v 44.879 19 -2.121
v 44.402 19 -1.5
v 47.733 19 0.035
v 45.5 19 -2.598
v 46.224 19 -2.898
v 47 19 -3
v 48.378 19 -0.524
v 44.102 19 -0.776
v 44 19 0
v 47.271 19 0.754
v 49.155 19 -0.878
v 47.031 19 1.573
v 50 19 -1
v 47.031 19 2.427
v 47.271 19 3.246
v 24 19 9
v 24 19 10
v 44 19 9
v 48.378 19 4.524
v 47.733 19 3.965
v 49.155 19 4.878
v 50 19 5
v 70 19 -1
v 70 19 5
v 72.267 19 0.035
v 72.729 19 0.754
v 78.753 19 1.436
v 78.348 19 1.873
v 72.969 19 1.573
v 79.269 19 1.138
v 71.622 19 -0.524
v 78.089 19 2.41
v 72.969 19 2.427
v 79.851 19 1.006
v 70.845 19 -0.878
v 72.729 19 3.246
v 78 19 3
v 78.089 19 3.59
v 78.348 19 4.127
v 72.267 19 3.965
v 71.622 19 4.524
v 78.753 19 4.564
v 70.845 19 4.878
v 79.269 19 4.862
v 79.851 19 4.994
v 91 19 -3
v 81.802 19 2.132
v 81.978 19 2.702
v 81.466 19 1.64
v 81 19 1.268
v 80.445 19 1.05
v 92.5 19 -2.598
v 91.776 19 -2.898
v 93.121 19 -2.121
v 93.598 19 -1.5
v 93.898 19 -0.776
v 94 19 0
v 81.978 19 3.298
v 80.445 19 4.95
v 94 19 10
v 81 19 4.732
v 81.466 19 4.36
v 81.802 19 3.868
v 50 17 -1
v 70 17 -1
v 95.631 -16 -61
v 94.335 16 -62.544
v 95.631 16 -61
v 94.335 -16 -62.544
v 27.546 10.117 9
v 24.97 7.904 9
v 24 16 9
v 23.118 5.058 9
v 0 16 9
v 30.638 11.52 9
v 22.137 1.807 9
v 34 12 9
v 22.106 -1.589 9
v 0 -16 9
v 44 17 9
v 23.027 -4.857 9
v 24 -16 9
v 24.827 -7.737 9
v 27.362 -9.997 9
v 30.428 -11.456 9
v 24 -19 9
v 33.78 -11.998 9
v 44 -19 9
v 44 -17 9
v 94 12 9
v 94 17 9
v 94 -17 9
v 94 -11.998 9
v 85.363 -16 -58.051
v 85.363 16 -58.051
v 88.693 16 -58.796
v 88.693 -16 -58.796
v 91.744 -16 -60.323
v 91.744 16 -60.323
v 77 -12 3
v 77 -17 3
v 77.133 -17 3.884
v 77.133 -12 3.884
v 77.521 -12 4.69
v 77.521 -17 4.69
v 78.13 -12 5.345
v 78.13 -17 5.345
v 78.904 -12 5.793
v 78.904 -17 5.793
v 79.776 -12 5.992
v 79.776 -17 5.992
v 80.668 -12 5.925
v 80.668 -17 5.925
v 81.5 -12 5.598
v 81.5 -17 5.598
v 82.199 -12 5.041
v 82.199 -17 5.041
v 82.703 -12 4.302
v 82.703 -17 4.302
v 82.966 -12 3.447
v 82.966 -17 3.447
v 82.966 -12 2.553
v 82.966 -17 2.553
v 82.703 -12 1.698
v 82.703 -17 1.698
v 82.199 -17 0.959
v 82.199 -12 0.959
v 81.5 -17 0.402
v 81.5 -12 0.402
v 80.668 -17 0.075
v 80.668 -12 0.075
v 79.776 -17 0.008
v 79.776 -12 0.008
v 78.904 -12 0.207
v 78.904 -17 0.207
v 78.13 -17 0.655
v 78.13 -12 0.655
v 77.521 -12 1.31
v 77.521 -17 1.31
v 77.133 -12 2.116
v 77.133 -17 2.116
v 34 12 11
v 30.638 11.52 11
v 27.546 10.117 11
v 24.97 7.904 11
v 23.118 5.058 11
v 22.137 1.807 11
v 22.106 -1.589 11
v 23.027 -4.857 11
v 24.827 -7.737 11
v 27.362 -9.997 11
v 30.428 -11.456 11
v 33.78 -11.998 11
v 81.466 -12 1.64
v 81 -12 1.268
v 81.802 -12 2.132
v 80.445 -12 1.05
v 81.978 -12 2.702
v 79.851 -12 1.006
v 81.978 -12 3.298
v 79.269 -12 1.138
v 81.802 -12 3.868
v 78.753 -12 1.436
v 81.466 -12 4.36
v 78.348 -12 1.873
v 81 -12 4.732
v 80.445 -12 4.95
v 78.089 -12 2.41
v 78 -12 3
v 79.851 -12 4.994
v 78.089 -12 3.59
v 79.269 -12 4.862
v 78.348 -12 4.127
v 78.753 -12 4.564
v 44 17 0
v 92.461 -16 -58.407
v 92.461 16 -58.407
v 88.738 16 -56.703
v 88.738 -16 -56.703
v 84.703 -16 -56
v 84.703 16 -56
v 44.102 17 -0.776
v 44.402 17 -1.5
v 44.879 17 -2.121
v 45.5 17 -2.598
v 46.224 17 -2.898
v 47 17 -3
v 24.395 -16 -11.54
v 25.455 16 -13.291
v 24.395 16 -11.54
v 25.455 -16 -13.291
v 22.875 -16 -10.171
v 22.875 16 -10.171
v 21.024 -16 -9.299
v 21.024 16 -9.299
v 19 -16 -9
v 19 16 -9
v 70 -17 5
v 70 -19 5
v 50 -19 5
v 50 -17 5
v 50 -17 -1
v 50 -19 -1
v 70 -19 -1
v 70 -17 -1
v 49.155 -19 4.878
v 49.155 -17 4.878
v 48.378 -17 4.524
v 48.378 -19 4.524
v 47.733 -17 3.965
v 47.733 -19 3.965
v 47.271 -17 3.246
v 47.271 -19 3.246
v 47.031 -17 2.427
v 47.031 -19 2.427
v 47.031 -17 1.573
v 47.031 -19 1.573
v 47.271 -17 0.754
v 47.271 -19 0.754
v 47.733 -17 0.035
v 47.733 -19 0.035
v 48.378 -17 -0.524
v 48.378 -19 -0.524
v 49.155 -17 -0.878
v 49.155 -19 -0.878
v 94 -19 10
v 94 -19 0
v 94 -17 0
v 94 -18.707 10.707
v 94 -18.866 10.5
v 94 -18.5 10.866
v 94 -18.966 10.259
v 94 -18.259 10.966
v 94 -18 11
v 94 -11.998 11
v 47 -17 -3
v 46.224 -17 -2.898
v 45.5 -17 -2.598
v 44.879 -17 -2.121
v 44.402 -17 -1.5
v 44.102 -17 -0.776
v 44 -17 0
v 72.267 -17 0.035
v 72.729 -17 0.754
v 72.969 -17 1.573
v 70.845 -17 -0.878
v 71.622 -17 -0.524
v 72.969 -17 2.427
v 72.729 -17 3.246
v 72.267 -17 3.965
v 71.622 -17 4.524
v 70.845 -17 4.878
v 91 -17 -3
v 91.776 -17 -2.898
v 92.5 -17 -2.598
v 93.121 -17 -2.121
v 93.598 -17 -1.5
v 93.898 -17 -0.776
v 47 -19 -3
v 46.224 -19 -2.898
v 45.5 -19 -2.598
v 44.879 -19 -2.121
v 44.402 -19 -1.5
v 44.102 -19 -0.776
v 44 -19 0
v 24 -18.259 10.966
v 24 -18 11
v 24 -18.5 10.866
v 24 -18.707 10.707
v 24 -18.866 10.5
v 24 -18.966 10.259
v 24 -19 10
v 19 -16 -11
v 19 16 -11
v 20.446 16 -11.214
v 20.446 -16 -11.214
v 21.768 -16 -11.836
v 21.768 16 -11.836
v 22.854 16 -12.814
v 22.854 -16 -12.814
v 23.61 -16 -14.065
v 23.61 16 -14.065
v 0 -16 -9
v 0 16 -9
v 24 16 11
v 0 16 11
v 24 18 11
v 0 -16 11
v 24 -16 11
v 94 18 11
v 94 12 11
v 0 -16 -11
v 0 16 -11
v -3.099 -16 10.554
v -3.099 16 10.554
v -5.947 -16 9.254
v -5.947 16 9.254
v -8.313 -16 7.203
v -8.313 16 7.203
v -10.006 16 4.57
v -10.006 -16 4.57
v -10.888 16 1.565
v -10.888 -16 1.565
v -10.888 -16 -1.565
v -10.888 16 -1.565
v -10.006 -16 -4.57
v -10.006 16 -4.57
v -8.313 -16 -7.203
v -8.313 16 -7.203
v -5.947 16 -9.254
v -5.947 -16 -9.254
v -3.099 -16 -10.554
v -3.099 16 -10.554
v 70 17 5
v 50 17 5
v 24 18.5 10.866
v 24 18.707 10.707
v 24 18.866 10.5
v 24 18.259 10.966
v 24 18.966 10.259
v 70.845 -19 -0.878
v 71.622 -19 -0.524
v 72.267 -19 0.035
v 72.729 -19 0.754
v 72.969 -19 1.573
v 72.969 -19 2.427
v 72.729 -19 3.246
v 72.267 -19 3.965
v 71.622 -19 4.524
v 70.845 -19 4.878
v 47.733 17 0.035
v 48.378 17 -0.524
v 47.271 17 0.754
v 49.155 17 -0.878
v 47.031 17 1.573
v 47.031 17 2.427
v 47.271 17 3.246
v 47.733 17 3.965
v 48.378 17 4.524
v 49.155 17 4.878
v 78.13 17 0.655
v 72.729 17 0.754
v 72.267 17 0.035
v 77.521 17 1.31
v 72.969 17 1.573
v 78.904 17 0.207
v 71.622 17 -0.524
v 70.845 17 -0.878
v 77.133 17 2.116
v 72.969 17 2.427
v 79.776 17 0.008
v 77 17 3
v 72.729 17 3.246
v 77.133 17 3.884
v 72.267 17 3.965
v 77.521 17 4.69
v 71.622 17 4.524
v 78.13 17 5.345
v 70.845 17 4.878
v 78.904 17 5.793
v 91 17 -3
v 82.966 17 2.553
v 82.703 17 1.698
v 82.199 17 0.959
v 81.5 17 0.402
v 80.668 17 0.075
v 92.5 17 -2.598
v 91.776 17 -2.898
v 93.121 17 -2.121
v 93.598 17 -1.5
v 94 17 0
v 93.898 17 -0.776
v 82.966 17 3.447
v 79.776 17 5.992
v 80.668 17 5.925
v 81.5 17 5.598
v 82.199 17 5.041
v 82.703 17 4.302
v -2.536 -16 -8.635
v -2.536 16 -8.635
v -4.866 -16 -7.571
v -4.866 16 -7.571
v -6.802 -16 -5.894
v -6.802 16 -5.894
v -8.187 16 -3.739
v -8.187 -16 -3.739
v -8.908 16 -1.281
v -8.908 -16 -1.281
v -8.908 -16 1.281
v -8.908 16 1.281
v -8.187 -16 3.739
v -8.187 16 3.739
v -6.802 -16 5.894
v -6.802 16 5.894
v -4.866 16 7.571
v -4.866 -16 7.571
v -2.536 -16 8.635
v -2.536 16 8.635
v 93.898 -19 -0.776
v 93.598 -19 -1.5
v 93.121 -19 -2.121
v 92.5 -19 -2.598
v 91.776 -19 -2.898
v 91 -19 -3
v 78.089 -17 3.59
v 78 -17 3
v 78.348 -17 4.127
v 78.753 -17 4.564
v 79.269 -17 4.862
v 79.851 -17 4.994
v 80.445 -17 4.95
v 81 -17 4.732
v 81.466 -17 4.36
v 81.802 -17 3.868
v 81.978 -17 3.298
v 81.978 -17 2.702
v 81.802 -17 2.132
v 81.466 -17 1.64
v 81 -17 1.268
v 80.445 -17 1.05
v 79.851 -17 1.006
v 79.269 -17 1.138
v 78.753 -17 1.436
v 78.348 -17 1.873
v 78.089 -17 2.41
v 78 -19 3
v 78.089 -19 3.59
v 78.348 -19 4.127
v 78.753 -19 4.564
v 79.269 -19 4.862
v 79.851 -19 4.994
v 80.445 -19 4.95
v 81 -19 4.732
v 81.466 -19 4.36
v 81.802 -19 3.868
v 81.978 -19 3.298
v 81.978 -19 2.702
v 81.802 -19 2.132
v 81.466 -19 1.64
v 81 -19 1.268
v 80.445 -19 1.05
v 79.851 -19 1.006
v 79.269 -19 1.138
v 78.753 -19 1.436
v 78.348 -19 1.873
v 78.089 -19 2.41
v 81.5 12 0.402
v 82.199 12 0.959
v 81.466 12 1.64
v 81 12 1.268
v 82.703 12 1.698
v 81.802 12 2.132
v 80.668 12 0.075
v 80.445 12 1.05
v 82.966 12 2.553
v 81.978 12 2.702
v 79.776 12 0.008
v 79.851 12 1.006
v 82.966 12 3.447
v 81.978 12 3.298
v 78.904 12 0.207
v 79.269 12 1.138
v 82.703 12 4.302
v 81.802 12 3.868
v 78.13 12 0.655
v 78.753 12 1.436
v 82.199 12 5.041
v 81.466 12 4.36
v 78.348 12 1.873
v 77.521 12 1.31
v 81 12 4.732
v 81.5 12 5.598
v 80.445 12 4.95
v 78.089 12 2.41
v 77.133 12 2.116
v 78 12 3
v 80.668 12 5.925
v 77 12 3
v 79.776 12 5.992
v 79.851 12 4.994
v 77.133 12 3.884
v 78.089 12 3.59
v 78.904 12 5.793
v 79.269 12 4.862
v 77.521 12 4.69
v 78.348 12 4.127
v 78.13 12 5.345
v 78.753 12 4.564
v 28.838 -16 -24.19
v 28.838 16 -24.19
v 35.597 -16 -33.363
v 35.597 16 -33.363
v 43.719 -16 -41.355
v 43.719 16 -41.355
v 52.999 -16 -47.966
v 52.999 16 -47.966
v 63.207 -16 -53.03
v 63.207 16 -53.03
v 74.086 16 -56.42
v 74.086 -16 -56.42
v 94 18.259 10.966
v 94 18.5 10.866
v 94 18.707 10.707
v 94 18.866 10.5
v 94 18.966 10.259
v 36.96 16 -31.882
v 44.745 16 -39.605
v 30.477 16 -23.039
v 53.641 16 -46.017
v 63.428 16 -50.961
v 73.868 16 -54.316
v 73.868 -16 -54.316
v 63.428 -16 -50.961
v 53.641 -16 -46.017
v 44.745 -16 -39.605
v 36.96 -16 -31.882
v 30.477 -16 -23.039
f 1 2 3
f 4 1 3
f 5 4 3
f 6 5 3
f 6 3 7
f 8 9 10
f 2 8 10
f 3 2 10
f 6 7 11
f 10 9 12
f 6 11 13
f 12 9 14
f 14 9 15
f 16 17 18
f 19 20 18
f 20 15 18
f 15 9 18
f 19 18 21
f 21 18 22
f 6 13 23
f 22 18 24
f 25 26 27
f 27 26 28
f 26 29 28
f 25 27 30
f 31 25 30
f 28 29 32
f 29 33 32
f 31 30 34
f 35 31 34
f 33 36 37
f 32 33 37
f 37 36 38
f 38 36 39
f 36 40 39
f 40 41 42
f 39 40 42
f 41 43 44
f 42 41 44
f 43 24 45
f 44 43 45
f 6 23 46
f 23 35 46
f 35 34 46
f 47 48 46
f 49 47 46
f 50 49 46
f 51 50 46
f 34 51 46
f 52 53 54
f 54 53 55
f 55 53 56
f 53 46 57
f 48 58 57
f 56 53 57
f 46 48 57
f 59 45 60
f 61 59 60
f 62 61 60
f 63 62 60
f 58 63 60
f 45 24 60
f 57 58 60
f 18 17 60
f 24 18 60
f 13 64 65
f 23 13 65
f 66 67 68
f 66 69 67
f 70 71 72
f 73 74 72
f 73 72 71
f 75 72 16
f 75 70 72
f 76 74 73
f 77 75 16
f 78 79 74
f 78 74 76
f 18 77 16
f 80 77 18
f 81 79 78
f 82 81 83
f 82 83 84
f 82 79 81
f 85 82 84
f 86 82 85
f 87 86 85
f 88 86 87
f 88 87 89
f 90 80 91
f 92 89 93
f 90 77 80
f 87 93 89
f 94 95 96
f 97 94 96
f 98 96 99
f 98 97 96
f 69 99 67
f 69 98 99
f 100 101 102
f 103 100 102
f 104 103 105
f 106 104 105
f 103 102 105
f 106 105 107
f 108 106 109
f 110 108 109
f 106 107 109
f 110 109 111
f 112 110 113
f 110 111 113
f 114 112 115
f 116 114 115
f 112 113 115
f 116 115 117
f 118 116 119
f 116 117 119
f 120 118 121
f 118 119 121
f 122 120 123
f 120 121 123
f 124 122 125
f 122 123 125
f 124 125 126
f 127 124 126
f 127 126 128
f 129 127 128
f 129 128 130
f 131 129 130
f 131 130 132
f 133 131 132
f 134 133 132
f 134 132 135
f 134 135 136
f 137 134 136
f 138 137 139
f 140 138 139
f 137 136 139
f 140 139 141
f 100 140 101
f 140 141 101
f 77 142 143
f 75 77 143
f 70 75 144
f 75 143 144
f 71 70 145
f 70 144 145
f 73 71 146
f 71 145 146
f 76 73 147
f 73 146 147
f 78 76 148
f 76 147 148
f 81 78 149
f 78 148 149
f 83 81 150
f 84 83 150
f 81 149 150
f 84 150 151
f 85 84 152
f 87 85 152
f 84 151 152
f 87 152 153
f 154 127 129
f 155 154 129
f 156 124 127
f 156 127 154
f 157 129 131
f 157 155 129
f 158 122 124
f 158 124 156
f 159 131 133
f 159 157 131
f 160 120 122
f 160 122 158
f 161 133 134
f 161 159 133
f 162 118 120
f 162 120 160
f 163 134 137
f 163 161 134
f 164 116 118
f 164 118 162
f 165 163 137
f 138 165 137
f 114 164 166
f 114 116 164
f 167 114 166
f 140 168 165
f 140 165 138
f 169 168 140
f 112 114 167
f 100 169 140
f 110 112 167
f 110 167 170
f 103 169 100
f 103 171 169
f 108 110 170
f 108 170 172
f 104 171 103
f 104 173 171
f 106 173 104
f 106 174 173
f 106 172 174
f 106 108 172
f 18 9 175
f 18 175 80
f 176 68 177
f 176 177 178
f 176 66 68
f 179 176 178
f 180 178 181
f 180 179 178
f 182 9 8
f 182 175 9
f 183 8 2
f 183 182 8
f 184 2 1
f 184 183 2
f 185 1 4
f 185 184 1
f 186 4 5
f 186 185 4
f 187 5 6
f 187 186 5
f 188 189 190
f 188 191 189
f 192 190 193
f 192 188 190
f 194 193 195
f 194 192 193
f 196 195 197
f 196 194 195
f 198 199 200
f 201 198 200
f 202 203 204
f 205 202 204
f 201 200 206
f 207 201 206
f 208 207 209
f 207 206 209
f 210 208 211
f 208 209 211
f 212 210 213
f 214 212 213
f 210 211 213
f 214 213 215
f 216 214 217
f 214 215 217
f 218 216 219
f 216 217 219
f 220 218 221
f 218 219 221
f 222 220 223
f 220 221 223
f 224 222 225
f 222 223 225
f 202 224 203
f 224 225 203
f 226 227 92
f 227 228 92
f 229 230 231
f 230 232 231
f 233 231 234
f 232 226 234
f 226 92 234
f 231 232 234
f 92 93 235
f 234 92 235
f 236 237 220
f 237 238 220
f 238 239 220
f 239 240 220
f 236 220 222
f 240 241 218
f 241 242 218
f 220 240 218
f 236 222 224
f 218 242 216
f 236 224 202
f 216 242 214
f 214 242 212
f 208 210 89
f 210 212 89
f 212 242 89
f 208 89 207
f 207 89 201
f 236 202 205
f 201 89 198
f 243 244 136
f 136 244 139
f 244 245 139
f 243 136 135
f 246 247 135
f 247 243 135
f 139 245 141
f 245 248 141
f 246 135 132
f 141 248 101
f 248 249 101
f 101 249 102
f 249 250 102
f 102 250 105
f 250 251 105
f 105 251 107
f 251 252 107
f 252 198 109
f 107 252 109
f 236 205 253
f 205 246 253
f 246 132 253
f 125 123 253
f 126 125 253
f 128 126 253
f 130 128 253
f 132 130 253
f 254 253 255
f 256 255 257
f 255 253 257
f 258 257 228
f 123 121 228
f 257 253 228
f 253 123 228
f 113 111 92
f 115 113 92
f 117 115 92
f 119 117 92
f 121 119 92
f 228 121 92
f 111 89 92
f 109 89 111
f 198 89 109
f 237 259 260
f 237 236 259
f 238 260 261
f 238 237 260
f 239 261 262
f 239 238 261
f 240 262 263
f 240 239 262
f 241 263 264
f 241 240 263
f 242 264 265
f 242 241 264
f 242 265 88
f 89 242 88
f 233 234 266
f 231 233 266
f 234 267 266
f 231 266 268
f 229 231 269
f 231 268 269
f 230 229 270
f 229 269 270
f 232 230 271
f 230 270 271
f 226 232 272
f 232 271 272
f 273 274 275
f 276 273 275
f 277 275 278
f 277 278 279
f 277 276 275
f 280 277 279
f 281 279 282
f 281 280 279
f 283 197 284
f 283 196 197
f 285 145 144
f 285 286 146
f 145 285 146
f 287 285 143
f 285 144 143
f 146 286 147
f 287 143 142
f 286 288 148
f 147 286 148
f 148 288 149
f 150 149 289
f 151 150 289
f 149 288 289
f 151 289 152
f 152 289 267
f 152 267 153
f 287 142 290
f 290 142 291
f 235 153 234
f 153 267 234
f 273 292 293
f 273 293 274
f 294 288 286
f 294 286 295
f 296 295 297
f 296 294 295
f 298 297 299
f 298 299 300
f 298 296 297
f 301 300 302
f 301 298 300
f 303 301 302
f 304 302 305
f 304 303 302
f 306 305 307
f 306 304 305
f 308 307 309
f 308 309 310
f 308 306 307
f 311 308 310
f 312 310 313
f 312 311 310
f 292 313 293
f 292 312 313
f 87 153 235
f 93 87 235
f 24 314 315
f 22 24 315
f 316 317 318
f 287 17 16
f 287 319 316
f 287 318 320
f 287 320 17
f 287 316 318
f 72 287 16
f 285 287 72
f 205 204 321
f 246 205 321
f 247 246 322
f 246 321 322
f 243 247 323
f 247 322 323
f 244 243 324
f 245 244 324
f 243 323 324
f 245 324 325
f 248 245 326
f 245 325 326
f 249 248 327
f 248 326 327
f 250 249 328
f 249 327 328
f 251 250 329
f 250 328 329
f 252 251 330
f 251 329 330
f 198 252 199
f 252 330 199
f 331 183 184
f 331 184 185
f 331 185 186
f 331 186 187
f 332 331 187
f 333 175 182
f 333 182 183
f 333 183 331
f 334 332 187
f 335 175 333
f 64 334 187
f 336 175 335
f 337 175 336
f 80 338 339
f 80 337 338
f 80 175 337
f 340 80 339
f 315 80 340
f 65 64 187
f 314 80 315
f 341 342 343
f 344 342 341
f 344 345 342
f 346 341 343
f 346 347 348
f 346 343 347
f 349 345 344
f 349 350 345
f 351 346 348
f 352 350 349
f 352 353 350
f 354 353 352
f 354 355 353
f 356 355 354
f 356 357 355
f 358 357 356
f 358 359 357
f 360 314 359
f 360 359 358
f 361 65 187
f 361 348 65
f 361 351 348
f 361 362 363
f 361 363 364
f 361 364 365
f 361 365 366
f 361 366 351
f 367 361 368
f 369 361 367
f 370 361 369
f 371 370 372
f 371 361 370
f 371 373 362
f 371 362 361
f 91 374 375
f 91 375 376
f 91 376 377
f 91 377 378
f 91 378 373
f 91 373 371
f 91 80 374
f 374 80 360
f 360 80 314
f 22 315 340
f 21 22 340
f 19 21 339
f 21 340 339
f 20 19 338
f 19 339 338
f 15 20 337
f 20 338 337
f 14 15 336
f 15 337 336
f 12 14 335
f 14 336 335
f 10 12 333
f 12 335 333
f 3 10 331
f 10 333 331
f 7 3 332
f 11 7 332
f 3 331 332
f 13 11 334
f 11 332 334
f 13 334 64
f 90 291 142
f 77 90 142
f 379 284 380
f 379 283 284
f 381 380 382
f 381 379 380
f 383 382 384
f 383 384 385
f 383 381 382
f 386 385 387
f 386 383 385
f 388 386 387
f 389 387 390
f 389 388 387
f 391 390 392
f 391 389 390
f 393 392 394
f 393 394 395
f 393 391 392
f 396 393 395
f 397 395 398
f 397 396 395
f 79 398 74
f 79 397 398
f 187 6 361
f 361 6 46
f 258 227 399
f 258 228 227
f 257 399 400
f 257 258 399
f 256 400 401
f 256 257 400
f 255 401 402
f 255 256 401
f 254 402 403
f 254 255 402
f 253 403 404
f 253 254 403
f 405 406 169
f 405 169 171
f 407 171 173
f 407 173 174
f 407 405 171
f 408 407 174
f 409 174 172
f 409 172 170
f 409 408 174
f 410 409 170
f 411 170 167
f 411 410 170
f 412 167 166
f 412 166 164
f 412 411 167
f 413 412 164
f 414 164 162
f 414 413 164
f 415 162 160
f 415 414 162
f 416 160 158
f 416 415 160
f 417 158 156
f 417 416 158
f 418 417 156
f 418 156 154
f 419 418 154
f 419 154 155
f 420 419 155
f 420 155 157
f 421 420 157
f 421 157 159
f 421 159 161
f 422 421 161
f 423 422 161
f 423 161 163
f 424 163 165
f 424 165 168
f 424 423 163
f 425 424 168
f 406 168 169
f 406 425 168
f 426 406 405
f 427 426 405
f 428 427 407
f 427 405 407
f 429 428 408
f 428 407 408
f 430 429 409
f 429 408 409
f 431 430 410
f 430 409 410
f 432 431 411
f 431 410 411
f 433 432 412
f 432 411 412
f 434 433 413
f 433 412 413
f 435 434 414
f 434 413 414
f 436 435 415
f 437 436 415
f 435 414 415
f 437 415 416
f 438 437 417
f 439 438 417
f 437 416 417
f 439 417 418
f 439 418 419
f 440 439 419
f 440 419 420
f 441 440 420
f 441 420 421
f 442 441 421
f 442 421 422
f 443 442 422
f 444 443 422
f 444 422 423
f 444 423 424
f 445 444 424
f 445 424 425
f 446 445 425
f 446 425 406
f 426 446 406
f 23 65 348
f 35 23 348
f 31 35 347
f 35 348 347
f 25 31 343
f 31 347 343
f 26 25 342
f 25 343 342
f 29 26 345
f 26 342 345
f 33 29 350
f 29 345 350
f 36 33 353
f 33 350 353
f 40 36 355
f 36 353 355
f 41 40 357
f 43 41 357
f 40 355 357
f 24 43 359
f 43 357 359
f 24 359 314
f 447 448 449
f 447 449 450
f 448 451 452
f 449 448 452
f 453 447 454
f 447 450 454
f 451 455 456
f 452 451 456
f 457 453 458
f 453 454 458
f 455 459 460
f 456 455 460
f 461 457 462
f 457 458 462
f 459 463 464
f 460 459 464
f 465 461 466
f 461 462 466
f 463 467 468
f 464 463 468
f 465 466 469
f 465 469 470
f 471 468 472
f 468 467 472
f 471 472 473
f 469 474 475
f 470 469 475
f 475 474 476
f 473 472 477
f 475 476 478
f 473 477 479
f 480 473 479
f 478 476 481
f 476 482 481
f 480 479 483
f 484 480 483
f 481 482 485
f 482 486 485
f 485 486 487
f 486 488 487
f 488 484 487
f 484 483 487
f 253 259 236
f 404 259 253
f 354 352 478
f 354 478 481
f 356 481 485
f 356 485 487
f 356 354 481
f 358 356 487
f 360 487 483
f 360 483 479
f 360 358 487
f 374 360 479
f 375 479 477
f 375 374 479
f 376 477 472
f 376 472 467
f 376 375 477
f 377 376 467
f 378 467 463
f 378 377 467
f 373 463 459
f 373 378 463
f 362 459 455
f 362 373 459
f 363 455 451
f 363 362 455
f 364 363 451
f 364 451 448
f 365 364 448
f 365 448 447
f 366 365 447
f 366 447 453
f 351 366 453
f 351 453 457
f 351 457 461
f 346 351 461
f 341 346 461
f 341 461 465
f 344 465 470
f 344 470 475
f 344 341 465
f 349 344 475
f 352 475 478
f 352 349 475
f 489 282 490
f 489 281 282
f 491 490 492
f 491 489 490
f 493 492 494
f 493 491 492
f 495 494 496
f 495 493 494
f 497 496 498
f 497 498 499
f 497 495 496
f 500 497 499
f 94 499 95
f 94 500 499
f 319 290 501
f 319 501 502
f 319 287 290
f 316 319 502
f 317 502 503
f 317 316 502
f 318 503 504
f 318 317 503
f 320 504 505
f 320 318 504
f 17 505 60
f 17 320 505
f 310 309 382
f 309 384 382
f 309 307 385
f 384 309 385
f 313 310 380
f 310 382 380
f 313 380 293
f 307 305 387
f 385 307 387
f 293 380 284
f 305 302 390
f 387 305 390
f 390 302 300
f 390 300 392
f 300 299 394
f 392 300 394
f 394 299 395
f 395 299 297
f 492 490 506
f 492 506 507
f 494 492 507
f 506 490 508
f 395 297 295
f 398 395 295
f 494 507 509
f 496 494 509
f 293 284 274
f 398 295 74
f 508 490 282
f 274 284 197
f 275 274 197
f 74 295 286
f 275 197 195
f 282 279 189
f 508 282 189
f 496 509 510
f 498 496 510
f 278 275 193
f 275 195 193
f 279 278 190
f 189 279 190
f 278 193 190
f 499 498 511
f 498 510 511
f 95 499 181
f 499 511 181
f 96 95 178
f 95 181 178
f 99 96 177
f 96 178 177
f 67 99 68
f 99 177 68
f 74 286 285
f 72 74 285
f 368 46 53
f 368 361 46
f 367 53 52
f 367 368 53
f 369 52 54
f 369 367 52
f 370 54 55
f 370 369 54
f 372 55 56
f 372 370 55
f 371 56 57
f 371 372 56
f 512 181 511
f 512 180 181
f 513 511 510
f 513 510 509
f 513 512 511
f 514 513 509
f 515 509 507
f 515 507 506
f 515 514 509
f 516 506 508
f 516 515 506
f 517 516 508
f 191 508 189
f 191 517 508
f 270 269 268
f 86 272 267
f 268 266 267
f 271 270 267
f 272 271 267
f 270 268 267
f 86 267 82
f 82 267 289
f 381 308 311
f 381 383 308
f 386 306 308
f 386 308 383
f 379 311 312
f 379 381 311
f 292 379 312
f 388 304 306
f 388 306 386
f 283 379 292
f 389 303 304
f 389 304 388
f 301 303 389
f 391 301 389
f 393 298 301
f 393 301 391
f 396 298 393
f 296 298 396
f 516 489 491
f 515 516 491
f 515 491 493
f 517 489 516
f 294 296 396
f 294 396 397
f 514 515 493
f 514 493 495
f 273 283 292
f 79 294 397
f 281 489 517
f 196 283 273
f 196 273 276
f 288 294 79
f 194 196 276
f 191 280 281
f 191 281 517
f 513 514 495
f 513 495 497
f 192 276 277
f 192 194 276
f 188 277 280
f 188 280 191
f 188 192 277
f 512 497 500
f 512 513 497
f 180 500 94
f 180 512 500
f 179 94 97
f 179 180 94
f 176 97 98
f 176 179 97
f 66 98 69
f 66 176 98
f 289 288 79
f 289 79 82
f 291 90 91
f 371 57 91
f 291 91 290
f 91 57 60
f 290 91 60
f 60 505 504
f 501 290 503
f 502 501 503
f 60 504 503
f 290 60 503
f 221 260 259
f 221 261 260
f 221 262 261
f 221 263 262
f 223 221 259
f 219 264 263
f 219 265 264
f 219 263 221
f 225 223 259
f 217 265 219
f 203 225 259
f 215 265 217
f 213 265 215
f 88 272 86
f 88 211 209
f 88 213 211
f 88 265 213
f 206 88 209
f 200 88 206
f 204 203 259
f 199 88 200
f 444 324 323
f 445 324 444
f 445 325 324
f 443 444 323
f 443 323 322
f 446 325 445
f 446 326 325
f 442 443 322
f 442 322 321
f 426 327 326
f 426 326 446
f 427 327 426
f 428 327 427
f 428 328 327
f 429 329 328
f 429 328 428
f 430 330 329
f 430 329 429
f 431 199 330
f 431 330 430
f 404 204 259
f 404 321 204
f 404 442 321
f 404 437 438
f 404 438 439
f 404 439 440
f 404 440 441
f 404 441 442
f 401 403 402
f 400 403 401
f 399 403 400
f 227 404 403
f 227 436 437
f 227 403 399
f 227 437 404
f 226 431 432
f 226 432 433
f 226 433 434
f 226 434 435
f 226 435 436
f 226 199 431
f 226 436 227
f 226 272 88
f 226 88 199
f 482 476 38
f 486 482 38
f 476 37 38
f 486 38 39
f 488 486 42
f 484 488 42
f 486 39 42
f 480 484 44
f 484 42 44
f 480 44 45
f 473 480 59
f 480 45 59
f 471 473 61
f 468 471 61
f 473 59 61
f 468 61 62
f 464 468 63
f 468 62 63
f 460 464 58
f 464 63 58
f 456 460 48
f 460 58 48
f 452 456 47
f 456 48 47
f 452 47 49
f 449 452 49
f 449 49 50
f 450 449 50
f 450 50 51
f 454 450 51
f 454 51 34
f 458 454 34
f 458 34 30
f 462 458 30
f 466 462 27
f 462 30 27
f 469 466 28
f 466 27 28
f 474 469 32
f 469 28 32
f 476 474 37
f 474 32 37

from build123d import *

# Parameters (mm, degrees)
F1_DEPTH  = 16
F2_W      = 70
F2_H      = 3
F3_DEPTH  = 2
F4_W      = 50
F4_H      = 14
F5_DEPTH  = 2
F6_R      = 1
F9_DEPTH  = 2
F11_DEPTH = 38.001
F13_D     = 4
F14_R     = 3
F14_R_2   = 2
F15_DEPTH = 5
F16_R     = 3


# Not quite as in the source:
# - a pattern or mirror of a feature is missing from the dataset's text; its kind, count and spacing are read off the source's solid


with BuildPart() as f1:
    # F0 (on Front) → F1 (new body)
    with BuildSketch(Plane.XZ):
        with BuildLine():
            Line((94, 11), (0, 11))
            ThreePointArc((0, 11), (-11, 0), (0, -11))
            Line((0, -11), (19, -11))
            ThreePointArc((19, -11), (21.7681124643, -11.8361612201), (23.6103896104, -14.064978646))
            ThreePointArc((23.6103896104, -14.064978646), (48.2280702466, -44.8445615778), (85.3629298173, -58.0511936248))
            ThreePointArc((85.3629298173, -58.0511936248), (90.2653686658, -59.4661290396), (94.3351335924, -62.5439468273))
            Line((94.3351335924, -62.5439468273), (95.6306588057, -61))
            ThreePointArc((95.6306588057, -61), (90.6542803924, -57.4351678896), (84.7034264019, -56))
            ThreePointArc((84.7034264019, -56), (49.0672193413, -42.9854179344), (25.4545454545, -13.2909701044))
            ThreePointArc((25.4545454545, -13.2909701044), (22.87535745, -10.1706257081), (19, -9))
            Line((19, -9), (0, -9))
            ThreePointArc((0, -9), (-9, 0), (0, 9))
            Line((0, 9), (94, 9))
            Line((94, 9), (94, 11))
        make_face()
    extrude(amount=F1_DEPTH)

    # F2 (on face) → F3 (join)
    with BuildSketch(Plane.XY.offset(11)):
        with Locations((59, -17.5)):
            Rectangle(F2_W, F2_H)
    extrude(amount=-F3_DEPTH)

    # F4 (on face) → F5 (join)
    with BuildSketch(Plane.XZ.offset(19)):
        with Locations((69, 4)):
            Rectangle(F4_W, F4_H)
    extrude(amount=-F5_DEPTH)

    # F6
    f6_edges = [f1.edges().sort_by_distance(p)[0] for p in [
        (59, -19, 11),
    ]]
    fillet(f6_edges, radius=F6_R)

    # F7: F1 across plane


with BuildPart() as f1_1:
    add(f1.part)
    add(f1.part.mirror(Plane.XZ))

    # F8 (on face) → F9 (cut)
    with BuildSketch(Plane.XY.offset(11)):
        with BuildLine():
            Line((94, 12), (34, 12))
            ThreePointArc((34, 12), (22.0005037904, 0.1099577956), (33.7800936413, -11.9979848805))
            Line((33.7800936413, -11.9979848805), (34.2199063587, -11.9979848805))
            Line((34.2199063587, -11.9979848805), (94, -11.9979848805))
            Line((94, -11.9979848805), (94, 12))
        make_face()
    extrude(amount=-F9_DEPTH, mode=Mode.SUBTRACT)

    # F10 (on face) → F11 (cut, through all)
    with BuildSketch(Plane.XZ.offset(19)):
        with BuildLine():
            ThreePointArc((50, 5), (47, 2), (50, -1))
            Line((50, -1), (70, -1))
            ThreePointArc((70, -1), (73, 2), (70, 5))
            Line((70, 5), (50, 5))
        make_face()
    extrude(amount=-F11_DEPTH, mode=Mode.SUBTRACT)

    # F13 (through all)
    with Locations(Plane.XZ.offset(19)):
        with Locations((80, 3)):
            Hole(F13_D / 2)

    # F14 (on face) → F15 (join)
    with BuildSketch(Plane(origin=(0, -17, 0), x_dir=(-1, 0, 0), z_dir=(0, 1, 0))):
        with Locations((-80, 3)):
            Circle(F14_R)
        with Locations((-80, 3)):
            Circle(F14_R_2, mode=Mode.SUBTRACT)
    f15 = extrude(amount=F15_DEPTH)

    # F15_copies: F15 across plane
    add(f15.mirror(Plane.ZX))

    # F16
    f16_edges = [f1_1.edges().sort_by_distance(p)[0] for p in [
        (94, -18, -3),
        (44, -18, -3),
        (44, 18, -3),
        (94, 18, -3),
    ]]
    fillet(f16_edges, radius=F16_R)


solid = f1_1.part
